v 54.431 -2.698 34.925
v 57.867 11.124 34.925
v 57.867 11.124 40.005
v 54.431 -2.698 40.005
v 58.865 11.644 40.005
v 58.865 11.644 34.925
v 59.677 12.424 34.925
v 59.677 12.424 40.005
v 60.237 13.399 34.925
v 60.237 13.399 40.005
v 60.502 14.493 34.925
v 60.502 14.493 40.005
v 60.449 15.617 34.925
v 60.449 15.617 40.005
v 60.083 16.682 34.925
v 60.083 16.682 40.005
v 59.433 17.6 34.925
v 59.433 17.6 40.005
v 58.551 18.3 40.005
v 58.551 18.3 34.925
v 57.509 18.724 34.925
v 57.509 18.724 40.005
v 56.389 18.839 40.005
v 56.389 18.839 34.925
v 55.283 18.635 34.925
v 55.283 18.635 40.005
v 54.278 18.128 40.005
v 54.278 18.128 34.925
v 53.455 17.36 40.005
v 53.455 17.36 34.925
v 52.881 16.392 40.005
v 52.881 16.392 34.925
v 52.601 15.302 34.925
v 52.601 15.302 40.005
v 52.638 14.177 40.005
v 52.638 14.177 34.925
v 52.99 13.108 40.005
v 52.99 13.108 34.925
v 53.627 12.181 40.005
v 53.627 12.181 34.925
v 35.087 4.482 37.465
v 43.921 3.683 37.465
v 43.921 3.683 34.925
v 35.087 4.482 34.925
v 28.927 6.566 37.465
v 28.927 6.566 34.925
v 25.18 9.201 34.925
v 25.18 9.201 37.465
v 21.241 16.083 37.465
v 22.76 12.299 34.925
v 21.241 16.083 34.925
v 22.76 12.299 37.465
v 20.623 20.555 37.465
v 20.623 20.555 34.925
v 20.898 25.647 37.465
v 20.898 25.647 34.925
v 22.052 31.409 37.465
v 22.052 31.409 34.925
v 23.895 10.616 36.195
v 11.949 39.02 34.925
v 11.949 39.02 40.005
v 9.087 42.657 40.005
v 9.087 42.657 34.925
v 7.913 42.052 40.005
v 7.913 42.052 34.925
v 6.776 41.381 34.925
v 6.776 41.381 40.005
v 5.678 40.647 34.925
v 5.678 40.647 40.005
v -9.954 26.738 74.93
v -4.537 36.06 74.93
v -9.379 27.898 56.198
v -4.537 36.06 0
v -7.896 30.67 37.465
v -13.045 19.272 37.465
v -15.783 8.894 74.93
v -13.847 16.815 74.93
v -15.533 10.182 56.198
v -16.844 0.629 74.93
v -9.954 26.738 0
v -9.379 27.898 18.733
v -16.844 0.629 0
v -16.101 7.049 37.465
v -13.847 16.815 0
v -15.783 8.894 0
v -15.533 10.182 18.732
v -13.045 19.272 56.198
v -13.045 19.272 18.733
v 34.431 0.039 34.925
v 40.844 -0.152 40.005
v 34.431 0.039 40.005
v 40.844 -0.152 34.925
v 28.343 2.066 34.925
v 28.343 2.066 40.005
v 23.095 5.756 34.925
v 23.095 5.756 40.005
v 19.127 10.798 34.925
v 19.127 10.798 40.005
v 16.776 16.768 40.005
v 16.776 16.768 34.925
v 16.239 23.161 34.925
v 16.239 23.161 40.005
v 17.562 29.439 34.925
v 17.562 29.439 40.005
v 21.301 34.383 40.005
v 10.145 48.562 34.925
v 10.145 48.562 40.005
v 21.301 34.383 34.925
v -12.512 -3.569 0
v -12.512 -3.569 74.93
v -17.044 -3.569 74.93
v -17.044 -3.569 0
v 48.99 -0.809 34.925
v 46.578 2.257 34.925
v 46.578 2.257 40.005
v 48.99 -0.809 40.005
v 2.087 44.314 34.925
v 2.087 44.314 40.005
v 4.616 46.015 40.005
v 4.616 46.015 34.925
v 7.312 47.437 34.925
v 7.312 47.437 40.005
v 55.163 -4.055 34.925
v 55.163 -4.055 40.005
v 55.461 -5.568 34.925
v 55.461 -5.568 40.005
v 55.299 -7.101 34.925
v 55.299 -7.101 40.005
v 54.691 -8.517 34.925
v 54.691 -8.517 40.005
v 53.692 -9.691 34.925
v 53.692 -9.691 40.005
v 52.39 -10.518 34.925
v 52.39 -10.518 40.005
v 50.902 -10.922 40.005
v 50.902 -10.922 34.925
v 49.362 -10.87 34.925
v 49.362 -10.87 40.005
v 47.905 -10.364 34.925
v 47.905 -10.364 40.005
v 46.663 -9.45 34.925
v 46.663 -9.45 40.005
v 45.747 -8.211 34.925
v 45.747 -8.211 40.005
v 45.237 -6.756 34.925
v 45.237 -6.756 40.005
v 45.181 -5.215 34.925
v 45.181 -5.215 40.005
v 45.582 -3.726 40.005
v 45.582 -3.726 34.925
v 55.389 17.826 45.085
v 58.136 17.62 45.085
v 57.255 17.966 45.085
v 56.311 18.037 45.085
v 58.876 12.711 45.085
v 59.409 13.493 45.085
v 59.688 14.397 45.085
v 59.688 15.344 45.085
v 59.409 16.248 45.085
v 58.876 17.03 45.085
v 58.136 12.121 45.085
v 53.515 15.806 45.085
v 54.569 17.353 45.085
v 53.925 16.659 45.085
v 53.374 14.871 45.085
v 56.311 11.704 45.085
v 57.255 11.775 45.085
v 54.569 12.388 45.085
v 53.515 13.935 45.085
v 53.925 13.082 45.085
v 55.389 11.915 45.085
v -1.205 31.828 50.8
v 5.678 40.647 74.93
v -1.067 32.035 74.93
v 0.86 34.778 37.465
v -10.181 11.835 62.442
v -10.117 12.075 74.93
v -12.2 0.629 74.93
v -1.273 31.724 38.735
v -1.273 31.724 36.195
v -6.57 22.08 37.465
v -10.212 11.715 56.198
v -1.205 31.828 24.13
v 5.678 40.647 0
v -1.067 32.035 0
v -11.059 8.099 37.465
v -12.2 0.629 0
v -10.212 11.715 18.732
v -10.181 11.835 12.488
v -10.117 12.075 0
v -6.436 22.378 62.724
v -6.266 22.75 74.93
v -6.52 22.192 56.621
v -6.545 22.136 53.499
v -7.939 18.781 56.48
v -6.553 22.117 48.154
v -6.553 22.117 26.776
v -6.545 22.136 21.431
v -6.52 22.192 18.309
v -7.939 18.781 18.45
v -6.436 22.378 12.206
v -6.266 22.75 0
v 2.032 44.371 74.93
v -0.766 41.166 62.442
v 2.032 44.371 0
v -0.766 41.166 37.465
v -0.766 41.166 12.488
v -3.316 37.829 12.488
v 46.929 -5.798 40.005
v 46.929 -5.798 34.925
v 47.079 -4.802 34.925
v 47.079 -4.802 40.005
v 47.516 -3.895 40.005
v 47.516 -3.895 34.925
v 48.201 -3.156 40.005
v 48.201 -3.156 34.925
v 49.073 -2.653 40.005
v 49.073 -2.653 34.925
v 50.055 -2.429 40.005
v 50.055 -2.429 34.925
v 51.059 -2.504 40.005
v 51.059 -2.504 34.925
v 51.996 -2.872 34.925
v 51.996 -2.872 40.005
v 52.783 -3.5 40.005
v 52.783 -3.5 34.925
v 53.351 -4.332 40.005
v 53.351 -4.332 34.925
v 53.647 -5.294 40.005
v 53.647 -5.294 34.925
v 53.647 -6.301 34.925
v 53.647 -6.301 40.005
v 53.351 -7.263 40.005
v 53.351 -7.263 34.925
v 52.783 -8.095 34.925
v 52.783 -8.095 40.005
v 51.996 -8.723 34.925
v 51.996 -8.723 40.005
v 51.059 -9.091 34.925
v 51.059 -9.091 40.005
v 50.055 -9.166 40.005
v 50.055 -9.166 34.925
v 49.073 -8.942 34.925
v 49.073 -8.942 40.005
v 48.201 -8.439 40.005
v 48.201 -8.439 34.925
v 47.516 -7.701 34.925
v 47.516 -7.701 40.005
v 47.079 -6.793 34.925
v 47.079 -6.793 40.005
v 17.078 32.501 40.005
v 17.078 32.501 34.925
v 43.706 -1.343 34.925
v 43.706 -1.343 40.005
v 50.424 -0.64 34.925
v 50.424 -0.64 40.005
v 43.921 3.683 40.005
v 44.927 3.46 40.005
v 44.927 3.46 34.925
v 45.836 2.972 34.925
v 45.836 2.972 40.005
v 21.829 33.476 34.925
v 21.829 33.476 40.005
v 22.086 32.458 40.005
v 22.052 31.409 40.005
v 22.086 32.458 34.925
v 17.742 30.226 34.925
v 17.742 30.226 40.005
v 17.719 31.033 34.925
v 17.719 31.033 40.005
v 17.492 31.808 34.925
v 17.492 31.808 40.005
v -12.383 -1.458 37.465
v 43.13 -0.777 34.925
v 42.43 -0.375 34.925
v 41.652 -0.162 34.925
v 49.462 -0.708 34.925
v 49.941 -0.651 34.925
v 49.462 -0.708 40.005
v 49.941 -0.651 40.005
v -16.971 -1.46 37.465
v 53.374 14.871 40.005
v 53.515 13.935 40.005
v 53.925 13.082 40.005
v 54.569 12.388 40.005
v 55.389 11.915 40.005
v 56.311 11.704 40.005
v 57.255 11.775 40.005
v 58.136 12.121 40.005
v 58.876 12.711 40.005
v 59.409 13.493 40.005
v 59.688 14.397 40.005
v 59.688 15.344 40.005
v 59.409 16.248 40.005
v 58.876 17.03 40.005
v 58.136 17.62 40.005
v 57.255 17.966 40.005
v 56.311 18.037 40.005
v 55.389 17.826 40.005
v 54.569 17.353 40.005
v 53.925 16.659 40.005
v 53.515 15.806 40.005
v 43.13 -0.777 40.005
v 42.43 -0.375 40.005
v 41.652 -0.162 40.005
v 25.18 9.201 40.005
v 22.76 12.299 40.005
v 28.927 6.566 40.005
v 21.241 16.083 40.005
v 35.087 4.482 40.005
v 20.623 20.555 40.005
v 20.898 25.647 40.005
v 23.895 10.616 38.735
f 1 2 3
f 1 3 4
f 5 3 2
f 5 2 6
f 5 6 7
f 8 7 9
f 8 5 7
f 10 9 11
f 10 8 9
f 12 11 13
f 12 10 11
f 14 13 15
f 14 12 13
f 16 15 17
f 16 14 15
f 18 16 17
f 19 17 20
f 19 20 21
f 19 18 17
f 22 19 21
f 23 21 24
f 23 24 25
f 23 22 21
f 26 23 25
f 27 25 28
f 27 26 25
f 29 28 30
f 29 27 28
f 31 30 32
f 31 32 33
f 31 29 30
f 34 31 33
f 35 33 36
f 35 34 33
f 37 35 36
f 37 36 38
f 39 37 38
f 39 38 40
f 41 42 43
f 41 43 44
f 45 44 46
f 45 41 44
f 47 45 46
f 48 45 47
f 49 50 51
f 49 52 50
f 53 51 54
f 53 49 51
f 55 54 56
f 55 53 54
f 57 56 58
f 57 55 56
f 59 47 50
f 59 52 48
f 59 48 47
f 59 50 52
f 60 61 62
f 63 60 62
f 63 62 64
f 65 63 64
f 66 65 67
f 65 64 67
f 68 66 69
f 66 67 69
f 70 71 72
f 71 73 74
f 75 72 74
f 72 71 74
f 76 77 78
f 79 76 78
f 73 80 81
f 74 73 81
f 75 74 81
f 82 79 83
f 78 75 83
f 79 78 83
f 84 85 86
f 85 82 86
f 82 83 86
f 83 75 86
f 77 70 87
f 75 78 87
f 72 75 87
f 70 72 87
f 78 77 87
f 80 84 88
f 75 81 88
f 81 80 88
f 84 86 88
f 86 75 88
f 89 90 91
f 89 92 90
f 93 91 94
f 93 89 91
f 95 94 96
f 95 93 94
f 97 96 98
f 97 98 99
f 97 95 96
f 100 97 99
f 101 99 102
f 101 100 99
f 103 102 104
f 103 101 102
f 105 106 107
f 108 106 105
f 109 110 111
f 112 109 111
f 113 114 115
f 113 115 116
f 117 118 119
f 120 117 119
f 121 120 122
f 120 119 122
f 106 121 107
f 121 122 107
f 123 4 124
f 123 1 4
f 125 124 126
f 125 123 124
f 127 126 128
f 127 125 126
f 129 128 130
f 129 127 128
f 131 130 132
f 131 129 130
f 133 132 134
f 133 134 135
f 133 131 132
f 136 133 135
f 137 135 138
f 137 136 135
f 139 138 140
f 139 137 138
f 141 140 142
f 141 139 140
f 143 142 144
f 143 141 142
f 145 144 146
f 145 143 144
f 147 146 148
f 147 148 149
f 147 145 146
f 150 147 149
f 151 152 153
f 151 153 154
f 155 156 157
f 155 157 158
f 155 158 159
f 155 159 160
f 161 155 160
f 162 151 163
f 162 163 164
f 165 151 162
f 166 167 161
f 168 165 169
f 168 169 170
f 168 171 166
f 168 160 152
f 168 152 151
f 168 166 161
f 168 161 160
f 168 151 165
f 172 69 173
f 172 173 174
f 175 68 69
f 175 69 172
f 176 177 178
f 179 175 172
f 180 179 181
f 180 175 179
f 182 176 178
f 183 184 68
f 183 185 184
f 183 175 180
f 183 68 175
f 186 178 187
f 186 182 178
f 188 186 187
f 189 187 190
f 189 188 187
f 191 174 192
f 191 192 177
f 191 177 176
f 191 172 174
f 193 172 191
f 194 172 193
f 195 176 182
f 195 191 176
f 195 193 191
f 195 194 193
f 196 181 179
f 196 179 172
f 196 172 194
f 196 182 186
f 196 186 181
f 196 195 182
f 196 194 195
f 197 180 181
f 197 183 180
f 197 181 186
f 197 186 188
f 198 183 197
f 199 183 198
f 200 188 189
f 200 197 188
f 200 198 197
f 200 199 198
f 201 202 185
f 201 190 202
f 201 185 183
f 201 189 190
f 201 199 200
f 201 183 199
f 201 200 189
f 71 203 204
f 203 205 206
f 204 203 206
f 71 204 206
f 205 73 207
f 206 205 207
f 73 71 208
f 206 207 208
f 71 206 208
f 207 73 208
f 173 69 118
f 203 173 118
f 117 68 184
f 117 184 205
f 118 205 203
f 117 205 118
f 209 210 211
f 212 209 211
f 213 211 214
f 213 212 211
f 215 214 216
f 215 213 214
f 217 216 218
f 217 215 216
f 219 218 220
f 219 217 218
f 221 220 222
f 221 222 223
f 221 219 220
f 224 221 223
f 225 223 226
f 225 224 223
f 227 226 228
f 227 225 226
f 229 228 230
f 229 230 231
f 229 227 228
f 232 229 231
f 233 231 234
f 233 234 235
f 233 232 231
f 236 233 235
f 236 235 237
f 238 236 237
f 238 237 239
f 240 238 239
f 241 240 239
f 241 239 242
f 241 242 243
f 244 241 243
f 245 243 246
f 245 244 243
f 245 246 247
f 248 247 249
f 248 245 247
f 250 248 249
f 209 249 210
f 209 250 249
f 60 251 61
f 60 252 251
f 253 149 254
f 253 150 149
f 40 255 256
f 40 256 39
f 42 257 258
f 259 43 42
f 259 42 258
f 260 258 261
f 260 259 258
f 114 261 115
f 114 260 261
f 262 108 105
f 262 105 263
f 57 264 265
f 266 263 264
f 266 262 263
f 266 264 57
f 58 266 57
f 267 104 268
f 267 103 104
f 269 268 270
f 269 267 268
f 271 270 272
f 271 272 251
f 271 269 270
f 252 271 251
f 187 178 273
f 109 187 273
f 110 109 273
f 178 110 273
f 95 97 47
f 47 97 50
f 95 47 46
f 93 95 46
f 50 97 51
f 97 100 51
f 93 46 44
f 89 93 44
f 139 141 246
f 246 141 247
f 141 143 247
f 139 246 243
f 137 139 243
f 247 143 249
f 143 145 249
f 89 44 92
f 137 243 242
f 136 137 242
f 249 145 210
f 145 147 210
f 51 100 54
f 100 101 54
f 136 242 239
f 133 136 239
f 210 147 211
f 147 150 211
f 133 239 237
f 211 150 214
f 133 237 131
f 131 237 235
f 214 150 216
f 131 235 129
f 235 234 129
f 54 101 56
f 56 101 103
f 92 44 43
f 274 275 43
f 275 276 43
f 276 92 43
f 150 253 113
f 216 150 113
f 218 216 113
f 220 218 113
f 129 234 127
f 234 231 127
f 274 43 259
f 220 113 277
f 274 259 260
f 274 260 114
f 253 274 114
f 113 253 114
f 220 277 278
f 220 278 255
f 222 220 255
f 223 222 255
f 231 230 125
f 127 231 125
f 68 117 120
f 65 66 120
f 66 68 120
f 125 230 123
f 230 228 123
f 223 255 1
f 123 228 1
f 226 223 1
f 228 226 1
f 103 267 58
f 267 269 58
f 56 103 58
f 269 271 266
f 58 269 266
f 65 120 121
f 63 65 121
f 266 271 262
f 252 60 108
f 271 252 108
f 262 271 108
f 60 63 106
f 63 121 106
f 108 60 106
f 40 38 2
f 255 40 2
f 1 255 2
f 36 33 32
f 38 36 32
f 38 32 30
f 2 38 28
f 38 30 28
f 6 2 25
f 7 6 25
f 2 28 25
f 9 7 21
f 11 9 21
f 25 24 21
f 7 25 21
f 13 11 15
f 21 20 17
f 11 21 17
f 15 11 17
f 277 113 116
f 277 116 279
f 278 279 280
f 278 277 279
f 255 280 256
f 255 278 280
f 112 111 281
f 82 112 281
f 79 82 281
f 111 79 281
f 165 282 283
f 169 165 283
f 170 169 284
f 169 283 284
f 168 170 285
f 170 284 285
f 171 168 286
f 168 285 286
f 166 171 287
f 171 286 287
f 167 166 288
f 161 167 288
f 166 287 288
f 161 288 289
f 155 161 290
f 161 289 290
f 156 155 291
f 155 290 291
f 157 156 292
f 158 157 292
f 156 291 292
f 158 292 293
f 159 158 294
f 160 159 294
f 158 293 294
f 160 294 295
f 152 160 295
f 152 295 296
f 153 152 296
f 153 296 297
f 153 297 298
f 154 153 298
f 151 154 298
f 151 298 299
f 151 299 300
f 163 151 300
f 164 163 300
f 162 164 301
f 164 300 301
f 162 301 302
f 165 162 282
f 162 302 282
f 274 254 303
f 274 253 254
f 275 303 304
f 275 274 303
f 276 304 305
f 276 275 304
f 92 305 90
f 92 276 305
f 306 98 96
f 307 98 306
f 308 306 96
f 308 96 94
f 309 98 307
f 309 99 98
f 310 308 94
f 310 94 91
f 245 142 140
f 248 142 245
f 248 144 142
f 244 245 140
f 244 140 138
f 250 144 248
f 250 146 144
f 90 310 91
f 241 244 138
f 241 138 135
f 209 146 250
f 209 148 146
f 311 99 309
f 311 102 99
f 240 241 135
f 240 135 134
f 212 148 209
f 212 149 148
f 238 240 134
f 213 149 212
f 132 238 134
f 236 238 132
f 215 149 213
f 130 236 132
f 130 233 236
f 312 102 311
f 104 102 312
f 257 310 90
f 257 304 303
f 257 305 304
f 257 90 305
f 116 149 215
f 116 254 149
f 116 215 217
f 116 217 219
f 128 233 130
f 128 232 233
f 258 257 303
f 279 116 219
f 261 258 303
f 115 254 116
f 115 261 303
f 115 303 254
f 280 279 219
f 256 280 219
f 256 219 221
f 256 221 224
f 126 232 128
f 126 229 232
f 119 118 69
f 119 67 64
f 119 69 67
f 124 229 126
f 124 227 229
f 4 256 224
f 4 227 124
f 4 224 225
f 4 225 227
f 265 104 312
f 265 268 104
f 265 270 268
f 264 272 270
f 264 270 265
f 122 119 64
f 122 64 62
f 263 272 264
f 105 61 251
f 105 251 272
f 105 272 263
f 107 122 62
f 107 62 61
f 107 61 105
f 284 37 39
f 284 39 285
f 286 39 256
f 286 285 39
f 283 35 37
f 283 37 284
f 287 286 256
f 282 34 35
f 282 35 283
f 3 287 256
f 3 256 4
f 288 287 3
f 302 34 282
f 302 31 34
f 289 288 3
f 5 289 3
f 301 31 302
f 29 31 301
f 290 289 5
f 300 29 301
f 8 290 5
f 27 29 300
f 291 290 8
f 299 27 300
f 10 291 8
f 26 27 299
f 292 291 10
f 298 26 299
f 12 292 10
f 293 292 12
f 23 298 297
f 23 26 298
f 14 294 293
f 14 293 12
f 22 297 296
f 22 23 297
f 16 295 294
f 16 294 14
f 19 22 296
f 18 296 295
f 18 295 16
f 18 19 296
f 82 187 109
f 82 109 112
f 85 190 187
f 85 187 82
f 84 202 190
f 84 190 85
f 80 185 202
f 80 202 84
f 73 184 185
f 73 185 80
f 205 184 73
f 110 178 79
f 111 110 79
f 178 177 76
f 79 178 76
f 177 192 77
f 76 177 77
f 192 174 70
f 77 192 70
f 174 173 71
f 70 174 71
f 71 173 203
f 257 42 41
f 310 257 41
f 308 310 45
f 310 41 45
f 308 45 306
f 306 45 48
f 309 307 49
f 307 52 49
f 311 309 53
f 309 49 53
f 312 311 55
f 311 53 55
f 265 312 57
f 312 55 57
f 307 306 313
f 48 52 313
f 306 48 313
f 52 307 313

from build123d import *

# Parameters (mm, degrees)
BOSS_EXTRUDE1_DEPTH      = 74.93
BOSS_EXTRUDE4_DEPTH      = 2.54
BOSS_EXTRUDE4_DEPTH_BACK = 2.54
BOSS_EXTRUDE6_DEPTH      = 74.93
BOSS_EXTRUDE7_DEPTH      = 74.93
SKETCH11_R               = 3.3782
BOSS_EXTRUDE8_DEPTH      = 2.54
SKETCH13_R               = 3.971263101
BOSS_EXTRUDE10_DEPTH     = 5.08
SKETCH12_R               = 3.175
BOSS_EXTRUDE9_DEPTH      = 5.08


with BuildPart() as part:
    # Sketch1 → Boss-Extrude1 (new body)
    with BuildSketch(Plane.XY):
        with BuildLine():
            Line((-16.295773791, 0.624640473), (-12.907508233, 0.624640473))
            Line((-12.907508233, 0.624640473), (-12.443267089, 3.164640473))
            add(Edge.make_bspline(
                [(-12.443267089, 3.164640473), (-12.30668745, 3.911907895), (-11.89696139, 6.153716378), (-11.35075536, 9.142778811), (-10.941162808, 11.384616955), (-10.804635025, 12.131895145)],
                knots=[0.002076118, 0.002076118, 0.002076118, 0.002076118, 0.004355051, 0.008912916, 0.011191849, 0.011191849, 0.011191849, 0.011191849], degree=3))
            add(Edge.make_bspline(
                [(-10.804635025, 12.131895145), (-10.131787944, 14.813925559), (-8.428636773, 20.08894476), (-4.769918918, 27.602373316), (-0.882056925, 33.370017928), (2.696640916, 37.629074894), (4.663596703, 39.6688962), (5.677623009, 40.647244333)],
                knots=[-0.595137067, -0.595137067, -0.595137067, -0.595137067, -0.254899084, 0.0853389, 0.425576884, 0.595695875, 0.765814867, 0.765814867, 0.765814867, 0.765814867], degree=3))
            Line((5.677623009, 40.647244333), (2.03170084, 44.371046934))
            add(Edge.make_bspline(
                [(2.03170084, 44.371046934), (1.545061943, 43.849333503), (0.584048879, 42.784657511), (-1.227882281, 40.634272171), (-4.205920413, 36.737641226), (-7.868630072, 30.842728735), (-11.285075765, 23.259160615), (-12.891126954, 17.928422411), (-13.516382283, 15.22778531)],
                knots=[0.192222826, 0.192222826, 0.192222826, 0.192222826, 0.287167093, 0.38211136, 0.571999893, 0.951776961, 1.331554028, 1.711331096, 1.711331096, 1.711331096, 1.711331096], degree=3))
            add(Edge.make_bspline(
                [(-13.516382283, 15.22778531), (-13.707651088, 14.222513225), (-14.09021448, 12.211975656), (-14.664139503, 9.196174334), (-15.238140346, 6.180406911), (-15.620861993, 4.169893716), (-15.812232602, 3.164640473)],
                knots=[-0.00268258, -0.00268258, -0.00268258, -0.00268258, 0.000387339, 0.003457258, 0.006527177, 0.009597097, 0.009597097, 0.009597097, 0.009597097], degree=3))
            Line((-15.812232602, 3.164640473), (-16.295773791, 0.624640473))
        make_face()
    extrude(amount=BOSS_EXTRUDE1_DEPTH)

    # Sketch4 → Boss-Extrude4 (add, two sides: drawn at the far end of the back side and taken through both)
    with BuildSketch(Plane(origin=(0, 0, 37.465), x_dir=(-1, 0, 0), z_dir=(0, 0, -1)).offset(-BOSS_EXTRUDE4_DEPTH_BACK)):
        with BuildLine():
            Line((-5.677623009, 40.647244333), (-2.087143894, 44.314419562))
            ThreePointArc((-2.087143894, 44.314419562), (-5.945357936, 46.761917563), (-10.144870483, 48.561961011))
            Line((-10.144870483, 48.561961011), (-12.342217859, 43.933321468))
            ThreePointArc((-12.342217859, 43.933321468), (-8.878894593, 42.556020468), (-5.677623009, 40.647244333))
        make_face()
    extrude(amount=BOSS_EXTRUDE4_DEPTH + BOSS_EXTRUDE4_DEPTH_BACK)

    # Sketch8 → Boss-Extrude6 (add)
    with BuildSketch(Plane(origin=(0, 0, 0), x_dir=(-1, 0, 0), z_dir=(0, 0, -1))):
        with BuildLine():
            Line((12.199993526, 0.628671187), (16.843743367, 0.628671187))
            add(Edge.make_bspline(
                [(-2.03170084, 44.371046934), (15.008940659, 25.494574417), (16.843743367, 0.628671187)],
                knots=[0, 0, 0, 1, 1, 1], degree=2))
            Line((-2.03170084, 44.371046934), (-5.677623009, 40.647244333))
            add(Edge.make_bspline(
                [(-5.677623009, 40.647244333), (9.879032096, 23.52153238), (12.199993526, 0.628671187)],
                knots=[0, 0, 0, 1, 1, 1], degree=2))
        make_face()
    extrude(amount=-BOSS_EXTRUDE6_DEPTH)

    # Sketch10 → Boss-Extrude7 (add)
    with BuildSketch(Plane.XY.offset(74.93)):
        with BuildLine():
            add(Edge.make_bspline(
                [(-17.044210577, -3.569022053), (-16.99706974, -1.449262713), (-16.843743367, 0.628671187)],
                knots=[0, 0, 0, 1, 1, 1], degree=2))
            Line((-16.843743367, 0.628671187), (-16.295006462, 0.628671187))
            Line((-16.295006462, 0.628671187), (-16.295773791, 0.624640473))
            Line((-16.295773791, 0.624640473), (-12.907508233, 0.624640473))
            Line((-12.907508233, 0.624640473), (-12.906771531, 0.628671187))
            Line((-12.906771531, 0.628671187), (-12.199993526, 0.628671187))
            add(Edge.make_bspline(
                [(-12.199993526, 0.628671187), (-12.410380076, -1.44648182), (-12.512012235, -3.569022053)],
                knots=[0, 0, 0, 1, 1, 1], degree=2))
            Line((-12.512012235, -3.569022053), (-17.044210577, -3.569022053))
        make_face()
    extrude(amount=-BOSS_EXTRUDE7_DEPTH)

    # Sketch11 → Boss-Extrude8 (add, symmetric)
    with BuildSketch(Plane(origin=(0, 0, 37.465), x_dir=(-1, 0, 0), z_dir=(0, 0, -1))):
        with BuildLine():
            Line((-6.661684739, 45.739942581), (-10.144870483, 48.561961011))
            Line((-10.144870483, 48.561961011), (-21.30072948, 34.383167777))
            ThreePointArc((-21.30072948, 34.383167777), (-21.992768178, 32.976186787), (-22.052439991, 31.409358033))
            add(Edge.make_bspline(
                [(-43.921175132, 3.682891736), (-14.804010115, 3.685410597), (-22.052439991, 31.409358033)],
                knots=[0, 0, 0, 1, 1, 1], degree=2))
            ThreePointArc((-43.921175132, 3.682891736), (-45.398270297, 3.247037241), (-46.577742371, 2.256772178))
            Line((-46.577742371, 2.256772178), (-48.989981542, -0.809118172))
            ThreePointArc((-48.989981542, -0.809118172), (-49.700911454, -0.673916534), (-50.423765203, -0.639517698))
            Line((-50.423765203, -0.639517698), (-54.431438085, 15.399576445))
            ThreePointArc((-54.431438085, 15.399576445), (-57.076455171, 16.988173168), (-58.666731899, 14.344165819))
            Line((-58.666731899, 14.344165819), (-54.431438085, -2.697927839))
            ThreePointArc((-54.431438085, -2.697927839), (-50.902490469, -10.922372789), (-45.581657306, -3.726283541))
            Line((-45.581657306, -3.726283541), (-43.706337234, -1.342802757))
            ThreePointArc((-43.706337234, -1.342802757), (-42.430425985, -0.374532318), (-40.844196848, -0.152329073))
            ThreePointArc((-40.844196848, -0.152329073), (-20.926969962, 8.132007566), (-17.561546975, 29.439285396))
            ThreePointArc((-17.561546975, 29.439285396), (-17.718806517, 31.033263625), (-17.077929798, 32.501178536))
            Line((-17.077929798, 32.501178536), (-11.948808892, 39.020151644))
            Line((-11.948808892, 39.020151644), (-6.661684739, 45.739942581))
        make_face()
        with Locations((-50.306976812, -5.797526095)):
            Circle(SKETCH11_R, mode=Mode.SUBTRACT)
    extrude(amount=BOSS_EXTRUDE8_DEPTH, both=True)

    # Sketch13 → Boss-Extrude10 (add)
    with BuildSketch(Plane.XY.offset(40.005)):
        with Locations((56.548749752, 14.870525834)):
            Circle(SKETCH13_R)
    extrude(amount=-BOSS_EXTRUDE10_DEPTH)

    # Sketch12 → Boss-Extrude9 (add)
    with BuildSketch(Plane.XY.offset(40.005)):
        with Locations(Location((56.548749752, 14.870525834, 0), (0, 0, 180))):
            Circle(SKETCH12_R)
    extrude(amount=BOSS_EXTRUDE9_DEPTH)


solid = part.part
